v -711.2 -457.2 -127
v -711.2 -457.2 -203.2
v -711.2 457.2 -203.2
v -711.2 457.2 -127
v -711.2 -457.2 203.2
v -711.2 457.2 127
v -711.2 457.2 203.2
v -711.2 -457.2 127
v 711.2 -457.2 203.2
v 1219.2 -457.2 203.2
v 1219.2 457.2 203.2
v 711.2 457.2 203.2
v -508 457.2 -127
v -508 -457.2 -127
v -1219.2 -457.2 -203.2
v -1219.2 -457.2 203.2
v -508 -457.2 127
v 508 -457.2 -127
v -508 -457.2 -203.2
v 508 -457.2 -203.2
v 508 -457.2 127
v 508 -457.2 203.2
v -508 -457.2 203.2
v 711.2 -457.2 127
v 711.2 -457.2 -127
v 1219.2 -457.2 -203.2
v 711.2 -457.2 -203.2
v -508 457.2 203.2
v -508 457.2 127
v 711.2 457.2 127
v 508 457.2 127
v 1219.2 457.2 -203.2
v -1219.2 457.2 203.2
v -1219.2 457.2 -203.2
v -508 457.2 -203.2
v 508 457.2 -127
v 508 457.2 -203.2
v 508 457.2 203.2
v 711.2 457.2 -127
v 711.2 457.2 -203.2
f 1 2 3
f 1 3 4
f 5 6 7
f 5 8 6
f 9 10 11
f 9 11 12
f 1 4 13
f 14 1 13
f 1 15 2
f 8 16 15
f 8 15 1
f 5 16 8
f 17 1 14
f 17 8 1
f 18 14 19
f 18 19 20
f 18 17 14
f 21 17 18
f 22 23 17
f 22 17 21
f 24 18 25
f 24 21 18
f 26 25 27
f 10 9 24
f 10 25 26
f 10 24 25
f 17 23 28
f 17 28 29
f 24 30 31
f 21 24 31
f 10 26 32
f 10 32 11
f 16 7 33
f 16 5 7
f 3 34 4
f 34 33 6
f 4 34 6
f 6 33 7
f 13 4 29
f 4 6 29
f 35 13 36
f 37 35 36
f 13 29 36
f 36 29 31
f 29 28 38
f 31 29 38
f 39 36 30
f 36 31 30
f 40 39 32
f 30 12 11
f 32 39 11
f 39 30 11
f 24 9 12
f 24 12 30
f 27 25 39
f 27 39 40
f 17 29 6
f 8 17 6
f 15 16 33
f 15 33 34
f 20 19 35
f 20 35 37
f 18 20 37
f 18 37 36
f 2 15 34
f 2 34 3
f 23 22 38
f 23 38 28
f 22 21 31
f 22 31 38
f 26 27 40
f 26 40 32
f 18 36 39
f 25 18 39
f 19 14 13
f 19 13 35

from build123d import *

# Parameters (mm, degrees)
F1_DEPTH = 457.2


with BuildPart() as f1:
    # F0 (on Front) → F1 (new body, symmetric)
    with BuildSketch(Plane.XZ):
        Polygon((-711.2, 203.2), (-1219.2, 203.2), (-1219.2, -203.2), (-711.2, -203.2), (-711.2, -127), (-508, -127), (-508, -203.2), (508, -203.2), (508, -127), (711.2, -127), (711.2, -203.2), (1219.2, -203.2), (1219.2, 203.2), (711.2, 203.2), (711.2, 127), (508, 127), (508, 203.2), (-508, 203.2), (-508, 127), (-711.2, 127), align=None)
    extrude(amount=F1_DEPTH, both=True)


solid = f1.part
